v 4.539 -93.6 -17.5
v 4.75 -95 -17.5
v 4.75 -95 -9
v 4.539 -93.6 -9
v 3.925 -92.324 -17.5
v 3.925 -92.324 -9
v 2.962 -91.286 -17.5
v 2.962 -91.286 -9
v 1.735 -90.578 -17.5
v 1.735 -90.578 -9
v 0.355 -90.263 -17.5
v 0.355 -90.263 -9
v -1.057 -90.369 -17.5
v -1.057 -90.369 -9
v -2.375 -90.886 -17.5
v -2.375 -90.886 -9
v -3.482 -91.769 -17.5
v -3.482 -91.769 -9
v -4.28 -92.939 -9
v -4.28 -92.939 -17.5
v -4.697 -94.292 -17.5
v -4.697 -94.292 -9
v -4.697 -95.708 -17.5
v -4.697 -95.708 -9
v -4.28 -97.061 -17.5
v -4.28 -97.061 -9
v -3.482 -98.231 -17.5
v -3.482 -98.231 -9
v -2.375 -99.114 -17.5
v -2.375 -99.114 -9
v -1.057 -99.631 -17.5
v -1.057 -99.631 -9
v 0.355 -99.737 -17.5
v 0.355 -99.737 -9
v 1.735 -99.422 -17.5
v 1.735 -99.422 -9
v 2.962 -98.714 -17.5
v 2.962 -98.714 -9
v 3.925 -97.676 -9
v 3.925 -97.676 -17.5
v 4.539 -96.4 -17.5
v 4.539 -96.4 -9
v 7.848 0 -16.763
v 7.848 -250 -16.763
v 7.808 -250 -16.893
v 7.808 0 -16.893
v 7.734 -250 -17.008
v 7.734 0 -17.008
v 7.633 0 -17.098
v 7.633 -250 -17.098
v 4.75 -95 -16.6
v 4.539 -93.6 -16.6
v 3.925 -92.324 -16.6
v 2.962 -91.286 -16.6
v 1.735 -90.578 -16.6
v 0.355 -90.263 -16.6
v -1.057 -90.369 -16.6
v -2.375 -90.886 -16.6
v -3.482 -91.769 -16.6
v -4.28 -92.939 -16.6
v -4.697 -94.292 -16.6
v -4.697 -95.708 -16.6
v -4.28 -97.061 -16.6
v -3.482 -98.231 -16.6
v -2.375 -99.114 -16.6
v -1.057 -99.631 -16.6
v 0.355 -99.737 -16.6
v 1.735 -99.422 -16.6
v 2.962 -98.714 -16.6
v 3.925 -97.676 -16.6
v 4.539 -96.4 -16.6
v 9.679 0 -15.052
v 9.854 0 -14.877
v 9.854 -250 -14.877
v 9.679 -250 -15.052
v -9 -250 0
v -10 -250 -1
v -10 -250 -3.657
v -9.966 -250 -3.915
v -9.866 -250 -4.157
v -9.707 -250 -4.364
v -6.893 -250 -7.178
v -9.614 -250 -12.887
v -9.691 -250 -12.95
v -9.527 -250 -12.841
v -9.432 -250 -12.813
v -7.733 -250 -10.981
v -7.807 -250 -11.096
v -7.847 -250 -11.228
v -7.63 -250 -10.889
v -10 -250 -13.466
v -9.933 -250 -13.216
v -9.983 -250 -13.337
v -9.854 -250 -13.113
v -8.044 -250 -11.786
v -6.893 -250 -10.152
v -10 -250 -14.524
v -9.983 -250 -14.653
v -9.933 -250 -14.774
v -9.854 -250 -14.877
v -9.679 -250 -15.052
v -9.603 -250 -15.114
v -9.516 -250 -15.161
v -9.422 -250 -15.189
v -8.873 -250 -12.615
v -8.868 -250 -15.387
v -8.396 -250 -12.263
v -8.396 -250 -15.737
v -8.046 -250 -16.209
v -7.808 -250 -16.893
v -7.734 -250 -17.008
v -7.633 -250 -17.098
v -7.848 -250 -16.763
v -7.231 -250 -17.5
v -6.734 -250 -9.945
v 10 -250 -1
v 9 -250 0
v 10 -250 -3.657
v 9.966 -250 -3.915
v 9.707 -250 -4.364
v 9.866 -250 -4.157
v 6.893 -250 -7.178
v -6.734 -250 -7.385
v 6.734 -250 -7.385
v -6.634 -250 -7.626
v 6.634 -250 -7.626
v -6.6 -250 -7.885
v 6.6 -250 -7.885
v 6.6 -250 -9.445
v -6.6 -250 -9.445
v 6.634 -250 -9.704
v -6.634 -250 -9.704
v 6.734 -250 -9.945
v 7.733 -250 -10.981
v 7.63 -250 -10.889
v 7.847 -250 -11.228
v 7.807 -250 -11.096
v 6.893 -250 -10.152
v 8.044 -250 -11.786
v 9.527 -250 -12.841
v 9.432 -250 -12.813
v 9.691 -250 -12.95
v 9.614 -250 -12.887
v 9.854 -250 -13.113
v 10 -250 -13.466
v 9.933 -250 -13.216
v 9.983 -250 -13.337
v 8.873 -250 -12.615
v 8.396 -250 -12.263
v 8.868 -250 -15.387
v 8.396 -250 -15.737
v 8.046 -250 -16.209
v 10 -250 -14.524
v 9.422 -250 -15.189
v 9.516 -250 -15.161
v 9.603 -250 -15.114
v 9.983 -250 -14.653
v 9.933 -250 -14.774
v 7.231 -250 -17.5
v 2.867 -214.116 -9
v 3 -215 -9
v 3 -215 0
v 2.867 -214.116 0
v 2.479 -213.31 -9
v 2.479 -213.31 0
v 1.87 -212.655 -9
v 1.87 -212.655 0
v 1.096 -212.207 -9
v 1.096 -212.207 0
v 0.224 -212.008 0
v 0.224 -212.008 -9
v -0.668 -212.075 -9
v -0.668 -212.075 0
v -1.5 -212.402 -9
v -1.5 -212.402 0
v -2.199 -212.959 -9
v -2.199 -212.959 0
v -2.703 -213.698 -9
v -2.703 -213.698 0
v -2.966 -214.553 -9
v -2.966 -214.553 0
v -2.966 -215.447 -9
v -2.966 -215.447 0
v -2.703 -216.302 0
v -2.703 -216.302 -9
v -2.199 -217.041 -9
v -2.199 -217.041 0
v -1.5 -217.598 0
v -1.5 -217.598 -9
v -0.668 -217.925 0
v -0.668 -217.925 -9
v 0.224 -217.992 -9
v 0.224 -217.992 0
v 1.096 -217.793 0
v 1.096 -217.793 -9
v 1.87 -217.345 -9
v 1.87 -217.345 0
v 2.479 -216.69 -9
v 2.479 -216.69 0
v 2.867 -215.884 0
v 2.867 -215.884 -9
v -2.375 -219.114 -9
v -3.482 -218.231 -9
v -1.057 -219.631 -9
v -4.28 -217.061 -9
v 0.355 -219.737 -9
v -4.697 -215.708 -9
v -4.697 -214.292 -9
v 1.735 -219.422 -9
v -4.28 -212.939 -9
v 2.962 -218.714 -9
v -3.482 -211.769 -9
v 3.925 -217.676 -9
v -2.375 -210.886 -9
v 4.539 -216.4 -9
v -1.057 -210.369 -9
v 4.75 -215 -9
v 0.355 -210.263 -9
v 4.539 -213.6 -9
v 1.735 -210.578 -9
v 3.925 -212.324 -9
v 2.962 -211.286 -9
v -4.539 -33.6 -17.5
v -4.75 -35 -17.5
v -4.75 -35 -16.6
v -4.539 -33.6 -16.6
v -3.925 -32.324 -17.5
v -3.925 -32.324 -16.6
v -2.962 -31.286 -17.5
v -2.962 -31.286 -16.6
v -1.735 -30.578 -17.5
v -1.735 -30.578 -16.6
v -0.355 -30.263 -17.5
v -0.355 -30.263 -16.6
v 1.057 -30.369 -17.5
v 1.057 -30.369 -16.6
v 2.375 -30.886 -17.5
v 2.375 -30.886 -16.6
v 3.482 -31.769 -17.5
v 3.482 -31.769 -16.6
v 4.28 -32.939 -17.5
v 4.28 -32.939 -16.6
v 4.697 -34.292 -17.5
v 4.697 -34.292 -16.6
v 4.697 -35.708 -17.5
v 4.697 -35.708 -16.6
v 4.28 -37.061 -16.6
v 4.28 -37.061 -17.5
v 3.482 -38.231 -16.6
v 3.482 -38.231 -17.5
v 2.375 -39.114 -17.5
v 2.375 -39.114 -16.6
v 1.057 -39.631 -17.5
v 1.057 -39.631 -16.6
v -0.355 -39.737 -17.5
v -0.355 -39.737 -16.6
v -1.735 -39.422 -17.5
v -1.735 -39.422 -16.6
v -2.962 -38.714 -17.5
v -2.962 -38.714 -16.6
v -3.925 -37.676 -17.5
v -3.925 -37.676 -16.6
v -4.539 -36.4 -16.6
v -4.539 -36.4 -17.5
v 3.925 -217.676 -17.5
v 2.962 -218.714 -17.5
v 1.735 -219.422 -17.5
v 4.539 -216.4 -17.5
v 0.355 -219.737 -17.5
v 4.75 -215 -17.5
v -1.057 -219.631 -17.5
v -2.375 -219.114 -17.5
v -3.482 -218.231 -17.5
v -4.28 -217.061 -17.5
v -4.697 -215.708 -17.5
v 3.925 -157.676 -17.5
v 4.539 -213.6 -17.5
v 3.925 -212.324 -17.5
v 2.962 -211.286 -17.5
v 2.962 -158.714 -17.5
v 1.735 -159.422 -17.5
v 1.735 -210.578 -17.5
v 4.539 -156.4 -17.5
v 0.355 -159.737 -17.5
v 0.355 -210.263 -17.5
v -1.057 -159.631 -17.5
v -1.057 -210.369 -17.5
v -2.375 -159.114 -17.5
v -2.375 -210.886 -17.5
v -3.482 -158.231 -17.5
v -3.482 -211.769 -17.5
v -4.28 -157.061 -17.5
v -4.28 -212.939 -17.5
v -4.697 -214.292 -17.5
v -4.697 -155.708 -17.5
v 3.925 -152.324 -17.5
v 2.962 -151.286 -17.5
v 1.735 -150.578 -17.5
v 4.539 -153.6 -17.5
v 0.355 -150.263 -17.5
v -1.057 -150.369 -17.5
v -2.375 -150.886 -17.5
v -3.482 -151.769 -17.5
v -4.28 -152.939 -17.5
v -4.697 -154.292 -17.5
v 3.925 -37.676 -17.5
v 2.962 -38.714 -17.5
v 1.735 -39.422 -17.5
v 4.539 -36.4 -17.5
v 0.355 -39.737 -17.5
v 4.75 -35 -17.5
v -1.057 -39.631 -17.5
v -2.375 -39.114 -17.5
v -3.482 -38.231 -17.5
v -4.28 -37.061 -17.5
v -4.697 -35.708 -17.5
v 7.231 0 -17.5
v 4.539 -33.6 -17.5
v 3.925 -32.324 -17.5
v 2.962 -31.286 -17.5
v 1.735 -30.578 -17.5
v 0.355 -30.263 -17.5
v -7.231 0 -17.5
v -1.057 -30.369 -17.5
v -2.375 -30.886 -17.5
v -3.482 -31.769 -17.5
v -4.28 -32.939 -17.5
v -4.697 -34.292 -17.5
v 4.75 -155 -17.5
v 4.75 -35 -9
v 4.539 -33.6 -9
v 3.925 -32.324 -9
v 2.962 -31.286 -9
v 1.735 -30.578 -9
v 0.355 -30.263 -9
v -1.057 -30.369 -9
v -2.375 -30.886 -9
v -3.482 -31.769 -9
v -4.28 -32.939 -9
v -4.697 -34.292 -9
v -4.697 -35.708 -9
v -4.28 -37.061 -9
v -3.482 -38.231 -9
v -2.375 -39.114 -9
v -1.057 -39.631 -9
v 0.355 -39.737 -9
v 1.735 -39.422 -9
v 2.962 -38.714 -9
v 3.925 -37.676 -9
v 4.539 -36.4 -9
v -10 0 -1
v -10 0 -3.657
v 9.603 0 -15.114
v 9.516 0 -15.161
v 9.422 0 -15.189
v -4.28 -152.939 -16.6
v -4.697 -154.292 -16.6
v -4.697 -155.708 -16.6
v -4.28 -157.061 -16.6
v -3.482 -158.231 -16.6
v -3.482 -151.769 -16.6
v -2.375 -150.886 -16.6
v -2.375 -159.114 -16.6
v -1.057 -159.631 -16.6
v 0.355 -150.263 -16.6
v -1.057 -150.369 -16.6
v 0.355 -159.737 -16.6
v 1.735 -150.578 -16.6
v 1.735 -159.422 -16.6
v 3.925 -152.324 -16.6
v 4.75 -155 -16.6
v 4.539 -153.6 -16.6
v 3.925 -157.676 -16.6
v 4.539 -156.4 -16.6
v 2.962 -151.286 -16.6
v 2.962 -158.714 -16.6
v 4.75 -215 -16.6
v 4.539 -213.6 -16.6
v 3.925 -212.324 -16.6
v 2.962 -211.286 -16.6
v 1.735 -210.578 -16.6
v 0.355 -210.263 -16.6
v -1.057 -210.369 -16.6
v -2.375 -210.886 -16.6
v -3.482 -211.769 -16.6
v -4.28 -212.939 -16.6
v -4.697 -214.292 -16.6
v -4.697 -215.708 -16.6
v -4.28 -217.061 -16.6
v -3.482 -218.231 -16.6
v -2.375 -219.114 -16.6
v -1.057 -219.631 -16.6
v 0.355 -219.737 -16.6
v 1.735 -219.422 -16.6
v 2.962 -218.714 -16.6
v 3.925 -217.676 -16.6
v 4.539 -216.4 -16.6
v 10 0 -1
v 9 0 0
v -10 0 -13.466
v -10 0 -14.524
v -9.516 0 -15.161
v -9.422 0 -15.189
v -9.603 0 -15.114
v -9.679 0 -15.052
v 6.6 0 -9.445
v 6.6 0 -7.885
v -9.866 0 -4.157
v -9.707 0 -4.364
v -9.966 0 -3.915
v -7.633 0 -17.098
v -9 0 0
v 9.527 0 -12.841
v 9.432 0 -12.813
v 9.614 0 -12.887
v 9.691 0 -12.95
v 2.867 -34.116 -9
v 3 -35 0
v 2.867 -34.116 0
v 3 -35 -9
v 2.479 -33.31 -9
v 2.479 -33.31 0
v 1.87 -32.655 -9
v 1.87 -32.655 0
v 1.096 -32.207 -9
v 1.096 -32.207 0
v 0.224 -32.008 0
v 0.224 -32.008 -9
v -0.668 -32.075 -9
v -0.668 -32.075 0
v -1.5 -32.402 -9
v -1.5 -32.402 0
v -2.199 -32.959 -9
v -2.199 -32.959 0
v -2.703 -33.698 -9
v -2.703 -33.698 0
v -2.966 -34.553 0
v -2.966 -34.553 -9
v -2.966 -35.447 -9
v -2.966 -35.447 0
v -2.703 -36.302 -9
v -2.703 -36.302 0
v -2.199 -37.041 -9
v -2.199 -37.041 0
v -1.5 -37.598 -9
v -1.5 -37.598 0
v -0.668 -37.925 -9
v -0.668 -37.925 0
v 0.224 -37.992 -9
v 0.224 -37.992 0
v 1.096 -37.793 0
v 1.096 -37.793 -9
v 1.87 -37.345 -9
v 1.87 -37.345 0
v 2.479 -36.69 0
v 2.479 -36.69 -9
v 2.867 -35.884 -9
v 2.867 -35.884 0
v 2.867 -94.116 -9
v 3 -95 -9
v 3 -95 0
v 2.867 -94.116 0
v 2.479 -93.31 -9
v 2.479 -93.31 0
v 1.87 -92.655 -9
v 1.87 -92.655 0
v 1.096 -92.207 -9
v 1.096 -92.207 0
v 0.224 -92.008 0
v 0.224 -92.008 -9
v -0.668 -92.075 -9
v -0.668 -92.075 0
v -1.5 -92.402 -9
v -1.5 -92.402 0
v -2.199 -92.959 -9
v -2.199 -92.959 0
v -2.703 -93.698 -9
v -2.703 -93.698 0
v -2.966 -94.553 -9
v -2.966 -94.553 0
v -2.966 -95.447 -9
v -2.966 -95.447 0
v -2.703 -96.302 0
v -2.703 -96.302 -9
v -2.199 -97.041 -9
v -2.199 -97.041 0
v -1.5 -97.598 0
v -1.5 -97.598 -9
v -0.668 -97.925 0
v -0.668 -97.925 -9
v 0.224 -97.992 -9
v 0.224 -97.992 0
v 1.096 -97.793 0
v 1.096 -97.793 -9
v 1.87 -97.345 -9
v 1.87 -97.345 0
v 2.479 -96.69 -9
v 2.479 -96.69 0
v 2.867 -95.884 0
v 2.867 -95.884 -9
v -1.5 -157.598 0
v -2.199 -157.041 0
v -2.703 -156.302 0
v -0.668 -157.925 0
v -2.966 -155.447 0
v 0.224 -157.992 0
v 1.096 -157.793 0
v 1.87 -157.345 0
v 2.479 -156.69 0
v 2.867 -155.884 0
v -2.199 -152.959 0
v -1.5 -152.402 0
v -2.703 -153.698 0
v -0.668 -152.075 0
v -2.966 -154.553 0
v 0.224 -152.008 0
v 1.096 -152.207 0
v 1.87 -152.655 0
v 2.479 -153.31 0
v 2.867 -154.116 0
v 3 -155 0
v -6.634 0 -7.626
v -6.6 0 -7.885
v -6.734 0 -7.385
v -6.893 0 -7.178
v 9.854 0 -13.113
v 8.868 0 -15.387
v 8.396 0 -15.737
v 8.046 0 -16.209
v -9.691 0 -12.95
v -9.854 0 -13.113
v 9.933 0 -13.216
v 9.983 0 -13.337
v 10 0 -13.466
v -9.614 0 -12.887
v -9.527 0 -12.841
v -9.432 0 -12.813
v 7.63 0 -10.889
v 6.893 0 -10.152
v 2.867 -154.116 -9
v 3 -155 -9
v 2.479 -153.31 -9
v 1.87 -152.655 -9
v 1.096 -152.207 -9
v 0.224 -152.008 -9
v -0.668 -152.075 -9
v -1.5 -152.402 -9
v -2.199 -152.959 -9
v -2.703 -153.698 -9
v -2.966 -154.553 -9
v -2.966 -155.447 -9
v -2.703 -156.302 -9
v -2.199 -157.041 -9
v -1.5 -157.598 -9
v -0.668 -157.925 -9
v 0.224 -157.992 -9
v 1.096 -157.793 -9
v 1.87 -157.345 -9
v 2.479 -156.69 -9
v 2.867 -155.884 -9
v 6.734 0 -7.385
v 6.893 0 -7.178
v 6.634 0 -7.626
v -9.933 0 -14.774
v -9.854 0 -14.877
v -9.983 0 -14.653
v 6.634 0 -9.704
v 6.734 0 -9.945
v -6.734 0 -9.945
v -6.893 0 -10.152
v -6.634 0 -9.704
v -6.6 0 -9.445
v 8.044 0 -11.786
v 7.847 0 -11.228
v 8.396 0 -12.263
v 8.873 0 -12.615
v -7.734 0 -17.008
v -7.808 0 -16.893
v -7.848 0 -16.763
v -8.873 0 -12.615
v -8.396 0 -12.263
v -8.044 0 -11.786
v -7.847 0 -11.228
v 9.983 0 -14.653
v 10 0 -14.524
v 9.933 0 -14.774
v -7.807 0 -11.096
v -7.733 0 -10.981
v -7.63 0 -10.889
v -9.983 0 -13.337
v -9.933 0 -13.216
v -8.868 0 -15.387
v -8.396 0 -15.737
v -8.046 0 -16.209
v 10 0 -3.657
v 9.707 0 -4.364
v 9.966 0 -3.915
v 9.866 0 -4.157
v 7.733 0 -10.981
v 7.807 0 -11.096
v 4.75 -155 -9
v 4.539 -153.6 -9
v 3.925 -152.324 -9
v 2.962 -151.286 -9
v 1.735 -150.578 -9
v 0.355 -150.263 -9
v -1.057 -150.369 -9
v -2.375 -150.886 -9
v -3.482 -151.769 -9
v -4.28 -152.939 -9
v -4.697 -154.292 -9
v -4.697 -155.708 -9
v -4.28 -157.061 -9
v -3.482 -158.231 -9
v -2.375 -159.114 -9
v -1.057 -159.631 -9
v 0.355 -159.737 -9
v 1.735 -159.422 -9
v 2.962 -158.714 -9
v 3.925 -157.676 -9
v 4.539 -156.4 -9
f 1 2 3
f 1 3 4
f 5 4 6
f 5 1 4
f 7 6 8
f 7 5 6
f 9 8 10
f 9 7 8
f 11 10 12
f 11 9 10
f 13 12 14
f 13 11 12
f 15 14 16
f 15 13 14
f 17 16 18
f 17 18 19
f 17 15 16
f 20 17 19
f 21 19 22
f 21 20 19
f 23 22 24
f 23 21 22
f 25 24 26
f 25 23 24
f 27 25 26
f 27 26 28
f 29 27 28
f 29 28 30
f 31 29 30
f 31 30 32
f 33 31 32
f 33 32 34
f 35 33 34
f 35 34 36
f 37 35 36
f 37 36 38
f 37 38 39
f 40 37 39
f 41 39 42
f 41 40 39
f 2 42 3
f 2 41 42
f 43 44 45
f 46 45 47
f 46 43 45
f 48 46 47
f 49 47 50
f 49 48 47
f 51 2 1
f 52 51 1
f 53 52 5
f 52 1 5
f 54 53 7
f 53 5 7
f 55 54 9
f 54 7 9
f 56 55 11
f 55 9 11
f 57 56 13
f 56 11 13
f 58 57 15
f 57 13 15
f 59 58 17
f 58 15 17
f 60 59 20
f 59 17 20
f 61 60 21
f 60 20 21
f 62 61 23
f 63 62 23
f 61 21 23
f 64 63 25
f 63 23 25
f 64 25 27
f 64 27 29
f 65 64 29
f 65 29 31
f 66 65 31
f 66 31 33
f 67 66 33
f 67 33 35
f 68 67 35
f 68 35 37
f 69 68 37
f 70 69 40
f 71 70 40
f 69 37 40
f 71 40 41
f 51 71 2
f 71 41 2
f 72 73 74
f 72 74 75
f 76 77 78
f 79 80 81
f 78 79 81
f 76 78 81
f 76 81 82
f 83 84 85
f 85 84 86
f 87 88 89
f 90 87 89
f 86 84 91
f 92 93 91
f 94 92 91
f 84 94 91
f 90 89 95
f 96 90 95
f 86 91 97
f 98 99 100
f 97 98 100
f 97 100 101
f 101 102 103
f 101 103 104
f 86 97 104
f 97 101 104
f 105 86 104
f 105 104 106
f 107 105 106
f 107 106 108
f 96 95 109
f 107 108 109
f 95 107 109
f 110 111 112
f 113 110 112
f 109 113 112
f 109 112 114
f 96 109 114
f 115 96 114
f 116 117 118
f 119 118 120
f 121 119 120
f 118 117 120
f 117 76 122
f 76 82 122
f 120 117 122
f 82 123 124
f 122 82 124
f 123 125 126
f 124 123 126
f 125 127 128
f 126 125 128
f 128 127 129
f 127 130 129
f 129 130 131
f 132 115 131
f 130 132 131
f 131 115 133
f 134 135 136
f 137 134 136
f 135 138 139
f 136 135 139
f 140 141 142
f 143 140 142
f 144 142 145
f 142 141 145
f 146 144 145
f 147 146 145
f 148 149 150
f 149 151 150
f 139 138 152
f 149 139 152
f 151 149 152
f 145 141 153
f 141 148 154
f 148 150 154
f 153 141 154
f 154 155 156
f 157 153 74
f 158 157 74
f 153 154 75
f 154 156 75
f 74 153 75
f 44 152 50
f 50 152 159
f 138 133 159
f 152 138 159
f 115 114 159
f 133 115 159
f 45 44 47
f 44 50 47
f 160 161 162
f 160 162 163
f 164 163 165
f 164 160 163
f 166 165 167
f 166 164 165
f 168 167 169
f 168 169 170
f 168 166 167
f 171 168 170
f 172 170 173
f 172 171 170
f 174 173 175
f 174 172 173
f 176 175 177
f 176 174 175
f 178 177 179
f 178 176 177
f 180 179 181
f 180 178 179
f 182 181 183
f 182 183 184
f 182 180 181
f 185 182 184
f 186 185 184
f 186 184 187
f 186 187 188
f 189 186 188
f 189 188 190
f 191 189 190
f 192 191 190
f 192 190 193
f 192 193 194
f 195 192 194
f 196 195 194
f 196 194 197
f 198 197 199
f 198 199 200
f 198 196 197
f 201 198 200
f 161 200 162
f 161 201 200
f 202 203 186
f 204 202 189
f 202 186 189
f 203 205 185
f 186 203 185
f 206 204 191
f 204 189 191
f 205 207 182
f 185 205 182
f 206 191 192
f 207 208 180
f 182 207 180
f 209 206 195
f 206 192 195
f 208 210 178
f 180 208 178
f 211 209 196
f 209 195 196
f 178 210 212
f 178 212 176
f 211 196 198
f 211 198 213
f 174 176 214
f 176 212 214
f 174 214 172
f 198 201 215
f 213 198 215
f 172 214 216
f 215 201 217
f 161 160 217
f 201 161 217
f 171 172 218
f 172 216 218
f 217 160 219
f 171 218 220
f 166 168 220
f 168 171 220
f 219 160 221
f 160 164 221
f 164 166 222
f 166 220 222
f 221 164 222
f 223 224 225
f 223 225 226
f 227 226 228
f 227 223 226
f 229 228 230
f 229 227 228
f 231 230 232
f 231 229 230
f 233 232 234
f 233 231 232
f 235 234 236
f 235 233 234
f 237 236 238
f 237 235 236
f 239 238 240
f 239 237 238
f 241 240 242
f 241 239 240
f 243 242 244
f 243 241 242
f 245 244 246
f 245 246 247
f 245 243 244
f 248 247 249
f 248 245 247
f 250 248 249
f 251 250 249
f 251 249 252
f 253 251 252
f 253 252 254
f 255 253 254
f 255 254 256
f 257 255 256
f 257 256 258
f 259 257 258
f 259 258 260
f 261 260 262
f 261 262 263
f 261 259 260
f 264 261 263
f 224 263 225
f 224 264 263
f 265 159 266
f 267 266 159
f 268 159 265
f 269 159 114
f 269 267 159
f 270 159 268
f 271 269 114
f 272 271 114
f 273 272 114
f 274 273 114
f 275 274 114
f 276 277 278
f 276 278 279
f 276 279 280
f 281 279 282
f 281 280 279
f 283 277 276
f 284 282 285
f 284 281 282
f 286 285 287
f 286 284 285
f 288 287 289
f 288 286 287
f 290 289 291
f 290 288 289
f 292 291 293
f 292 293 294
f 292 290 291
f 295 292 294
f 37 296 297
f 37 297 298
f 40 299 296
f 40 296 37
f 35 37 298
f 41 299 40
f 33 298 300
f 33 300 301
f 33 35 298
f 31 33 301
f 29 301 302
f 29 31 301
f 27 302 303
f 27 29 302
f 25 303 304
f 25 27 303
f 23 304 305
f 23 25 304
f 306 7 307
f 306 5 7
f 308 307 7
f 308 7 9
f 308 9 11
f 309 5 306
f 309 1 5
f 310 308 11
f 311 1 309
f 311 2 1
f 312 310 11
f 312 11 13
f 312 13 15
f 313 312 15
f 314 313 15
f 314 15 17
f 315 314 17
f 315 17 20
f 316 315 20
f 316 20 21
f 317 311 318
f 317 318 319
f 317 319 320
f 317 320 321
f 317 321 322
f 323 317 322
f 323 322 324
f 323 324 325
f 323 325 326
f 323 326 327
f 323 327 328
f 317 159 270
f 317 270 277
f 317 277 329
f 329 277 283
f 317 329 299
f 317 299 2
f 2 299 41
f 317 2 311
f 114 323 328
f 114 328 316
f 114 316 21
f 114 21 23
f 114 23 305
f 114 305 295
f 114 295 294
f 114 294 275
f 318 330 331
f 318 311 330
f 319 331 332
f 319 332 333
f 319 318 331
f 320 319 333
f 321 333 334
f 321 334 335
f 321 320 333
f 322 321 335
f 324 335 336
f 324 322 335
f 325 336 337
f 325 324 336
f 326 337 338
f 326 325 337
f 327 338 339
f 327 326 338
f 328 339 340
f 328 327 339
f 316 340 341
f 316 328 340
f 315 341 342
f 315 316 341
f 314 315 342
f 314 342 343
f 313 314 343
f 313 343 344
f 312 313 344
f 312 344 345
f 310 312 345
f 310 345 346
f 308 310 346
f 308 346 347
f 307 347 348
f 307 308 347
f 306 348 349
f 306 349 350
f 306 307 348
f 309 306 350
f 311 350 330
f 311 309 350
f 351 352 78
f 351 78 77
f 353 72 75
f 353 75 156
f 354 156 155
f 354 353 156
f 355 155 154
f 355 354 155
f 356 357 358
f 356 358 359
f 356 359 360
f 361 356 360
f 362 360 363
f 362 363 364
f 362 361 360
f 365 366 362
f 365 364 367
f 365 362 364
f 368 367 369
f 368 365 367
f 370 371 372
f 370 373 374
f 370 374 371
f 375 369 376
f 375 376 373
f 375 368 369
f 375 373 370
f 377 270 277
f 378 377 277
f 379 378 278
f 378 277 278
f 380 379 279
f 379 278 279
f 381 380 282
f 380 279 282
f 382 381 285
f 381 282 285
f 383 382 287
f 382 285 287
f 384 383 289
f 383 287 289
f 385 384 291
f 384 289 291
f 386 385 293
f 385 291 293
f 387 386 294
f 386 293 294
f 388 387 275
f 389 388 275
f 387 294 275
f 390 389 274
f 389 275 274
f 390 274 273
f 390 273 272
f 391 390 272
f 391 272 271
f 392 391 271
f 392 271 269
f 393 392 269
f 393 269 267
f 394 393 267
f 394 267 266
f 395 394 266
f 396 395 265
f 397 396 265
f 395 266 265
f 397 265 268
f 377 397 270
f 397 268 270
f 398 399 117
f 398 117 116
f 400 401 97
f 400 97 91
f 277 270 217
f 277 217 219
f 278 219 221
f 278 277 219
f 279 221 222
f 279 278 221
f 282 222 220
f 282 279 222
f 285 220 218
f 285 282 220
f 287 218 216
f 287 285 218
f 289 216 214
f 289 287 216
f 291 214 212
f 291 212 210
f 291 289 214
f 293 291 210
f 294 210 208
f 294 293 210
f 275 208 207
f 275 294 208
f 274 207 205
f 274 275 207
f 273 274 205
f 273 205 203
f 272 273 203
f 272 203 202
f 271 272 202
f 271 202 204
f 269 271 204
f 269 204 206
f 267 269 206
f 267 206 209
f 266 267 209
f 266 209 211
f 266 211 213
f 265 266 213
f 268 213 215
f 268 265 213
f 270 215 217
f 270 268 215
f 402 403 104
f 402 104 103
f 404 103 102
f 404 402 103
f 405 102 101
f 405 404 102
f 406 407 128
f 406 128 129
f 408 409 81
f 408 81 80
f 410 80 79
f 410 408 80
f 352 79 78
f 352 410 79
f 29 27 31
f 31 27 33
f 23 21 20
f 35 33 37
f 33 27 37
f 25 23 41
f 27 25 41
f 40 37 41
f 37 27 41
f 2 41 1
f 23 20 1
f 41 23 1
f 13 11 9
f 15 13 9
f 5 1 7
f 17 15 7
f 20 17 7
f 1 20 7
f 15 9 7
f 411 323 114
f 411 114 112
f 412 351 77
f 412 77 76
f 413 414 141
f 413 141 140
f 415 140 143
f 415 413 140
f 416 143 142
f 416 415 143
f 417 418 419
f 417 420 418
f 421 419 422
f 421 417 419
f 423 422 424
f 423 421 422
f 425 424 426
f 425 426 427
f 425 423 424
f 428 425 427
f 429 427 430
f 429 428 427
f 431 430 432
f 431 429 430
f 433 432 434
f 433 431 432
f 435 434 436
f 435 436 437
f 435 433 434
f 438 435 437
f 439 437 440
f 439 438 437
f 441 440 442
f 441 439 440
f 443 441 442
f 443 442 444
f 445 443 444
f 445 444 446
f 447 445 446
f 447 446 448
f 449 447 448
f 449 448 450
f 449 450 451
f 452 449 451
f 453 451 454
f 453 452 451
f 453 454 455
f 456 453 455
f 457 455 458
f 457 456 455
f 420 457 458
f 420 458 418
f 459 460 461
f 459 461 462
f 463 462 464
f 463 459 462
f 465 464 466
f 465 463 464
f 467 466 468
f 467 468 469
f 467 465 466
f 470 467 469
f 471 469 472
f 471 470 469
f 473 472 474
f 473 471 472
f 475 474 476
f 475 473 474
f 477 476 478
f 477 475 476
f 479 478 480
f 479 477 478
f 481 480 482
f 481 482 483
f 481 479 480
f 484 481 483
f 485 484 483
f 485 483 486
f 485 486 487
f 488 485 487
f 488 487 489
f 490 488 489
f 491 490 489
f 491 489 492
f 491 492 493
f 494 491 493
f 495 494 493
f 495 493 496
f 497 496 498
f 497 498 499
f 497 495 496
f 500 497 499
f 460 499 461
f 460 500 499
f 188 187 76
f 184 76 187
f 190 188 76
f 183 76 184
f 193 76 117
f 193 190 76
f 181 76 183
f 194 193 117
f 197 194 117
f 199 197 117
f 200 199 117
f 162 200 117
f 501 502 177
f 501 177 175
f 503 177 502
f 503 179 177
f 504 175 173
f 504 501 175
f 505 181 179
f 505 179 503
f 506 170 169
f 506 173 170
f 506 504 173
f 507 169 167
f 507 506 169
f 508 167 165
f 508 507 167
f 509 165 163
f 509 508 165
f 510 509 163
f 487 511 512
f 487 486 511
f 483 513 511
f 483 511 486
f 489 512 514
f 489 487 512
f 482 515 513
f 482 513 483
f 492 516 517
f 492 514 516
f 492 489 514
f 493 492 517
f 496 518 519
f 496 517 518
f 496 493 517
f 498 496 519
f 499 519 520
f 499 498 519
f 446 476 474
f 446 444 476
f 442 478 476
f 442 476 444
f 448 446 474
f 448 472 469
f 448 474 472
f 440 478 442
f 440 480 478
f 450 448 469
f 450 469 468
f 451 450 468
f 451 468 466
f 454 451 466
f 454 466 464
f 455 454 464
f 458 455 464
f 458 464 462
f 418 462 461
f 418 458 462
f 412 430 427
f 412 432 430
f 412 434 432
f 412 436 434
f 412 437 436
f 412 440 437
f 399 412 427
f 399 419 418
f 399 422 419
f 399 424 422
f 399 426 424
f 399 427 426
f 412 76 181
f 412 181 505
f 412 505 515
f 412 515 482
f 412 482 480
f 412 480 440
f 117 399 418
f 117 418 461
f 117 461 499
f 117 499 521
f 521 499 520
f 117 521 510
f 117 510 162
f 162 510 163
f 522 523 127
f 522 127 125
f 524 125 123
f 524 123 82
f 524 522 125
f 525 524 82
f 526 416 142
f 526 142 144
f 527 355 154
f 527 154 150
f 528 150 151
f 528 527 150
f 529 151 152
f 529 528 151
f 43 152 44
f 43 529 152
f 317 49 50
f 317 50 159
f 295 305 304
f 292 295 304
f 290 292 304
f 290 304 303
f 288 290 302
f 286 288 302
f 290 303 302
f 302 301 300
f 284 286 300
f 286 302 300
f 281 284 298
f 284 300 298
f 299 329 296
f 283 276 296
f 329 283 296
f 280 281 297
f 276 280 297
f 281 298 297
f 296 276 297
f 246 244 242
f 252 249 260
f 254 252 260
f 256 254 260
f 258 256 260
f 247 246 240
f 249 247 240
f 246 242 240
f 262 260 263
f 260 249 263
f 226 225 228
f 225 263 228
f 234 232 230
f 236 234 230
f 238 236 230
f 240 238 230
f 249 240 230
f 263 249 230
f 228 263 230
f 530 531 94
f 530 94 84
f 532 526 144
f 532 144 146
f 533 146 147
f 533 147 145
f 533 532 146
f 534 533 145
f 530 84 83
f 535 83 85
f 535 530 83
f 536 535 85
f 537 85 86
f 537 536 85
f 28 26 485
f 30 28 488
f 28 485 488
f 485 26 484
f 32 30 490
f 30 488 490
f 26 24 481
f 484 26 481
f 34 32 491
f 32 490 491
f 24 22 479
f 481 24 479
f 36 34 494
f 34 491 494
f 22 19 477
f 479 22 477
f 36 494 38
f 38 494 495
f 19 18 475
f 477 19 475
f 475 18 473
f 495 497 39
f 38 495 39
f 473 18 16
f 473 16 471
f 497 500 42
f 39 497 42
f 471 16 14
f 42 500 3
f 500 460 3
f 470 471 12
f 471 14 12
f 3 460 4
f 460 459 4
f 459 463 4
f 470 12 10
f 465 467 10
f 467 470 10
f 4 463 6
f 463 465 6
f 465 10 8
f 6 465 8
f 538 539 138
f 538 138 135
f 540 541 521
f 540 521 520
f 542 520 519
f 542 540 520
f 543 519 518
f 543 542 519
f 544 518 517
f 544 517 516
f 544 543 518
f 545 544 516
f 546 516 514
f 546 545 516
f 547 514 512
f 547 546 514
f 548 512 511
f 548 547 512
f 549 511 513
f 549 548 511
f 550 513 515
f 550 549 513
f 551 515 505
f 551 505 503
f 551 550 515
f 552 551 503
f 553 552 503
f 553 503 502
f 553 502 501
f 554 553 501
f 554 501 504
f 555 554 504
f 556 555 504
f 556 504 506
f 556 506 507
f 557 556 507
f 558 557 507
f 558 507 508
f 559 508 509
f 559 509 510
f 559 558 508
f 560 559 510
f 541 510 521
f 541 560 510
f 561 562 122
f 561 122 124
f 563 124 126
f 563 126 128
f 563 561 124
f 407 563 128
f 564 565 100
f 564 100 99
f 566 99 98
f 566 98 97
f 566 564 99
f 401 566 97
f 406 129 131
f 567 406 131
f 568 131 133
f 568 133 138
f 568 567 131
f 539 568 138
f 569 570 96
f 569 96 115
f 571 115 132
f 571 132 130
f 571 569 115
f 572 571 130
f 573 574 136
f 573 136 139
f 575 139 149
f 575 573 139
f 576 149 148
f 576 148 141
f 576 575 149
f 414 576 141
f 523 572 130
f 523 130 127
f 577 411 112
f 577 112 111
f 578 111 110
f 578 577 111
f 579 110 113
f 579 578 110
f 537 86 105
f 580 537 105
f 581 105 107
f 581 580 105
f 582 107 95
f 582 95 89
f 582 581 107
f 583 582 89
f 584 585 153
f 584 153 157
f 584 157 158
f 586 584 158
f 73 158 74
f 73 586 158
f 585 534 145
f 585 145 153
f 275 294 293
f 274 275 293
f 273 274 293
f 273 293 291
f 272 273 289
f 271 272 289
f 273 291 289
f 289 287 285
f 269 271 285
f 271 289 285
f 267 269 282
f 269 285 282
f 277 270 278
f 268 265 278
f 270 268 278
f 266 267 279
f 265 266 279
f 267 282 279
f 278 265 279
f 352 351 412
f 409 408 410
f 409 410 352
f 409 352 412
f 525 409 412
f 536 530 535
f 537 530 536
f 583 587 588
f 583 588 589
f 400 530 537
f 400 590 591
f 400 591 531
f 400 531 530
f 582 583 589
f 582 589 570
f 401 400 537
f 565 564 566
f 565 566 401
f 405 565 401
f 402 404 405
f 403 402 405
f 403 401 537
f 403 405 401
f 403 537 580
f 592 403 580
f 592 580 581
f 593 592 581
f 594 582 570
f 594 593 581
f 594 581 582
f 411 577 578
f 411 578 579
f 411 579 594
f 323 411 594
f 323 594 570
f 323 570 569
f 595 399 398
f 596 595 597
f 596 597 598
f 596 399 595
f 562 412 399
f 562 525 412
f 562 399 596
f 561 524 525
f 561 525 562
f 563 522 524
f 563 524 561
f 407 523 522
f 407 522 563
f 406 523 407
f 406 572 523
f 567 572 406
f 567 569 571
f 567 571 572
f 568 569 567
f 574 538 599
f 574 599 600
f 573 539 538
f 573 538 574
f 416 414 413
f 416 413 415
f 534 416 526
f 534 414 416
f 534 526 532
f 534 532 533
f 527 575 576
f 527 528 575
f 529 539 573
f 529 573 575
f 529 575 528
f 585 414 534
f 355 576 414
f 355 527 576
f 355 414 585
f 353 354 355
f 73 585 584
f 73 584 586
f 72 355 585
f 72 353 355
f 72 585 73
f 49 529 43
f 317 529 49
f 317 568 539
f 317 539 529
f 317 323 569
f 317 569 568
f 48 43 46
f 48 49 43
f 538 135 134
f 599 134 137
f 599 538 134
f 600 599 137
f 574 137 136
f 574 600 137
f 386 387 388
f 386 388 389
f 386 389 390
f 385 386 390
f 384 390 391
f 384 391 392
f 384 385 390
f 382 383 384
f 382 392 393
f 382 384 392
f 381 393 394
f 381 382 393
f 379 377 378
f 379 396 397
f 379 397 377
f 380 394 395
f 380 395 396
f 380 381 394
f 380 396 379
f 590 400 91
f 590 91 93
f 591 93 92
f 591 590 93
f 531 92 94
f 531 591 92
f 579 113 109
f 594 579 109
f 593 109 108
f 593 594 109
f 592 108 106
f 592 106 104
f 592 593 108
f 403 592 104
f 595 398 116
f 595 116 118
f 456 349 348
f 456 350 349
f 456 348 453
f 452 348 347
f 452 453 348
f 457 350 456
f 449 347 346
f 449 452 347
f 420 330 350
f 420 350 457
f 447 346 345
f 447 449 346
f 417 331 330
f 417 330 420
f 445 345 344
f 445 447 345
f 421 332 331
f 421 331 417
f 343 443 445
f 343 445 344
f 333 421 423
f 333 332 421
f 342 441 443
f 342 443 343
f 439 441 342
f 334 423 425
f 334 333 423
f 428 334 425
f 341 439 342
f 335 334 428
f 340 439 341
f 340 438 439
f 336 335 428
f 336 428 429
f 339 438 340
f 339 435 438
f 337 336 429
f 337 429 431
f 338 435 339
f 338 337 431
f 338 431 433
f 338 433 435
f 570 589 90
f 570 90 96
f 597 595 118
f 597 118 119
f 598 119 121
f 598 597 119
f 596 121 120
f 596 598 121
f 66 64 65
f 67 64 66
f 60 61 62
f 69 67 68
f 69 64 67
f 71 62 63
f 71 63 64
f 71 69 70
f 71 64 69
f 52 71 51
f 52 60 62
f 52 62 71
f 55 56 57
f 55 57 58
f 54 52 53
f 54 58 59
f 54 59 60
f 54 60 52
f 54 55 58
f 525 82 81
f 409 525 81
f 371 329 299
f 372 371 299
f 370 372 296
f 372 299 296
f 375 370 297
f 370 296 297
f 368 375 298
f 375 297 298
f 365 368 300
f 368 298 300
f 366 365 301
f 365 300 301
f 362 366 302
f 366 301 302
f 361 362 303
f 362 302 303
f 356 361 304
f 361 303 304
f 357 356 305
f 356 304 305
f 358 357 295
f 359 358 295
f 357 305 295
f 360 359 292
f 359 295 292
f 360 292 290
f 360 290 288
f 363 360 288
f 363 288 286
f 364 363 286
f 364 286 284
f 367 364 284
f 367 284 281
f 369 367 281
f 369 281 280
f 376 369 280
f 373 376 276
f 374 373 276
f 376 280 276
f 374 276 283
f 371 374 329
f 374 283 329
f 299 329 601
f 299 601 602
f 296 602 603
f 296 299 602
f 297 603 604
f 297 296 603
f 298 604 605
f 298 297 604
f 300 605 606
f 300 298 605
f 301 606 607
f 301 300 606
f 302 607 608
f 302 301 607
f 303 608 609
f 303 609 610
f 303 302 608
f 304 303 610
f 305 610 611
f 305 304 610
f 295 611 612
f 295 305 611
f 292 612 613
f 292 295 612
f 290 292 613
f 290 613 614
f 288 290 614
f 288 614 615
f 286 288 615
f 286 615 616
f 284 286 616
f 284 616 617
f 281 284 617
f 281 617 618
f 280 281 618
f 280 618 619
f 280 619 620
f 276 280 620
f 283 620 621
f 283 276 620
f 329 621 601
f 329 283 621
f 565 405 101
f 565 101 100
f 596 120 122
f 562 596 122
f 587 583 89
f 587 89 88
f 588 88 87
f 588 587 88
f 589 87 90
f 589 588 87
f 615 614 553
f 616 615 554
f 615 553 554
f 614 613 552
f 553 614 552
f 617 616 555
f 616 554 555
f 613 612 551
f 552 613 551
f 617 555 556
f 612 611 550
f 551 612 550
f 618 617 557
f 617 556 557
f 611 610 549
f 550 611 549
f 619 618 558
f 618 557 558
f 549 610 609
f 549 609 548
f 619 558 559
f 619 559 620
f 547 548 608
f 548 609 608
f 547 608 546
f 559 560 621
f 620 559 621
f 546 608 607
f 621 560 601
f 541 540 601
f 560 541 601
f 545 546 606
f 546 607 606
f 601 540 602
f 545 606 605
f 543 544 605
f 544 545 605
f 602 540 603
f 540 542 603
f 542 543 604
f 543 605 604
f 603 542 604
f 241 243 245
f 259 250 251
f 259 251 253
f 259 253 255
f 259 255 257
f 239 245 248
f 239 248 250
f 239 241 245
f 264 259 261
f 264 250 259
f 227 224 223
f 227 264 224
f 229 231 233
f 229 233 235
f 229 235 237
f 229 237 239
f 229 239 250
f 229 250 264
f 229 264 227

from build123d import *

# Parameters (mm, degrees)
EXTRUDE_1_DEPTH              = 250
SKETCH_80_R                  = 4.75
EXTRUDE_12_DEPTH             = 0.9
PATTERN_START                = -17.499999985
PATTERN_LINEAR_1_OUTLINE_R   = 4.75
PATTERN_LINEAR_1_DEPTH       = 0.9
PATTERN_LINEAR_1_2_OUTLINE_R = 4.75
PATTERN_LINEAR_1_2_DEPTH     = 0.9
PATTERN_LINEAR_1_3_OUTLINE_R = 4.75
PATTERN_LINEAR_1_3_DEPTH     = 0.9
PATTERN_LINEAR_1_4_OUTLINE_R = 4.75
PATTERN_LINEAR_1_4_DEPTH     = 8.499999985
PATTERN_START_2              = -9
PATTERN_LINEAR_1_5_OUTLINE_R = 3
PATTERN_LINEAR_1_5_DEPTH     = 9


# Read off the part's stored shape, not the designer's step: Линейный массив1
with BuildPart() as part:
    # Эскиз1 → Бобышка-Вытянуть1 (new body)
    with BuildSketch(Plane(origin=(0, 0, 0), x_dir=(1, 0, 0), z_dir=(0, 1, 0))):
        with BuildLine():
            Line((-10, 3.656507036), (-10, 1))
            Line((-10, 1), (-9, 0))
            Line((-9, 0), (9, 0))
            Line((9, 0), (10, 1))
            Line((10, 1), (10, 3.656507036))
            ThreePointArc((10, 3.656507036), (9.92387953, 4.039190479), (9.707106773, 4.363613837))
            Line((9.707106773, 4.363613837), (6.892893227, 7.177827383))
            ThreePointArc((6.892893227, 7.177827383), (6.67612047, 7.502250741), (6.6, 7.884934184))
            Line((6.6, 7.884934184), (6.6, 9.445065806))
            ThreePointArc((6.6, 9.445065806), (6.67612047, 9.827749249), (6.892893227, 10.152172607))
            Line((6.892893227, 10.152172607), (7.63016236, 10.88944174))
            ThreePointArc((7.63016236, 10.88944174), (7.773916172, 11.035785914), (7.84680643, 11.2275378))
            ThreePointArc((7.84680643, 11.2275378), (8.39638832, 12.26292769), (9.431778202, 12.812509595))
            ThreePointArc((9.431778202, 12.812509595), (9.571493891, 12.861817755), (9.690625709, 12.949905089))
            Line((9.690625709, 12.949905089), (9.85355341, 13.11283279))
            ThreePointArc((9.85355341, 13.11283279), (9.961939771, 13.275044443), (10, 13.466386134))
            Line((10, 13.466386134), (10, 14.523613836))
            ThreePointArc((10, 14.523613836), (9.961939771, 14.714955527), (9.85355341, 14.87716718))
            Line((9.85355341, 14.87716718), (9.678500897, 15.052219693))
            ThreePointArc((9.678500897, 15.052219693), (9.560417661, 15.139748844), (9.421985093, 15.189159641))
            ThreePointArc((9.421985093, 15.189159641), (8.395921978, 15.736919382), (7.84816224, 16.7629825))
            ThreePointArc((7.84816224, 16.7629825), (7.775191486, 16.953000828), (7.632531165, 17.098189425))
            Line((7.632531165, 17.098189425), (7.230720605, 17.499999985))
            Line((7.230720605, 17.499999985), (-7.230720615, 17.499999985))
            Line((-7.230720615, 17.499999985), (-7.632531175, 17.098189425))
            ThreePointArc((-7.632531175, 17.098189425), (-7.775191503, 16.953000832), (-7.84816225, 16.7629825))
            ThreePointArc((-7.84816225, 16.7629825), (-8.395921997, 15.736919373), (-9.421985128, 15.189159636))
            ThreePointArc((-9.421985128, 15.189159636), (-9.560417671, 15.13974885), (-9.678500884, 15.052219716))
            Line((-9.678500884, 15.052219716), (-9.85355341, 14.87716719))
            ThreePointArc((-9.85355341, 14.87716719), (-9.961939771, 14.714955537), (-10, 14.523613846))
            Line((-10, 14.523613846), (-10, 13.466386134))
            ThreePointArc((-10, 13.466386134), (-9.961939771, 13.275044443), (-9.85355341, 13.11283279))
            Line((-9.85355341, 13.11283279), (-9.690625667, 12.949905047))
            ThreePointArc((-9.690625667, 12.949905047), (-9.57149389, 12.861817745), (-9.431778248, 12.812509604))
            ThreePointArc((-9.431778248, 12.812509604), (-8.396388337, 12.262927707), (-7.84680643, 11.2275378))
            ThreePointArc((-7.84680643, 11.2275378), (-7.773916168, 11.035785916), (-7.63016236, 10.88944174))
            Line((-7.63016236, 10.88944174), (-6.892893227, 10.152172607))
            ThreePointArc((-6.892893227, 10.152172607), (-6.67612047, 9.827749249), (-6.6, 9.445065806))
            Line((-6.6, 9.445065806), (-6.6, 7.884934184))
            ThreePointArc((-6.6, 7.884934184), (-6.67612047, 7.502250741), (-6.892893227, 7.177827383))
            Line((-6.892893227, 7.177827383), (-9.707106773, 4.363613837))
            ThreePointArc((-9.707106773, 4.363613837), (-9.92387953, 4.039190479), (-10, 3.656507036))
        make_face()
    extrude(amount=-EXTRUDE_1_DEPTH)

    # Эскиз6 → Вырез-Повернуть1 (revolve, cut)
    with BuildSketch(Plane(origin=(0, 30, 0), x_dir=(0, -1, 0), z_dir=(1, 0, 0)), mode=Mode.PRIVATE) as cut_revolve_1_sk:
        Polygon((60.25, 17.499999985), (65, 17.499999985), (65, 0), (62, 0), (62, 9), (60.25, 9), align=None)
    revolve(cut_revolve_1_sk.sketch.rotate(Axis((0, -35, -17.499999985), (0, 0, 1)), 270), axis=Axis((0, -35, -17.499999985), (0, 0, 1)), mode=Mode.SUBTRACT)

    # Pattern Linear 1 4 outline → Pattern Linear 1 4 (cut)
    with BuildSketch(Plane.XY.offset(PATTERN_START)):
        with Locations((0, -95)):
            Circle(PATTERN_LINEAR_1_4_OUTLINE_R)
        with Locations((0, -155)):
            Circle(PATTERN_LINEAR_1_4_OUTLINE_R)
        with Locations((0, -215)):
            Circle(PATTERN_LINEAR_1_4_OUTLINE_R)
    extrude(amount=PATTERN_LINEAR_1_4_DEPTH, mode=Mode.SUBTRACT)

    # Pattern Linear 1 5 outline → Pattern Linear 1 5 (cut)
    with BuildSketch(Plane.XY.offset(PATTERN_START_2)):
        with Locations((0, -95)):
            Circle(PATTERN_LINEAR_1_5_OUTLINE_R)
        with Locations((0, -155)):
            Circle(PATTERN_LINEAR_1_5_OUTLINE_R)
        with Locations((0, -215)):
            Circle(PATTERN_LINEAR_1_5_OUTLINE_R)
    extrude(amount=PATTERN_LINEAR_1_5_DEPTH, mode=Mode.SUBTRACT)


with BuildPart() as body_2:
    # Эскиз80 → Бобышка-Вытянуть12 (new body)
    with BuildSketch(Plane(origin=(0, 0, -17.499999985), x_dir=(-1, 0, 0), z_dir=(0, 0, -1))):
        with Locations((0, -35)):
            Circle(SKETCH_80_R)
    extrude(amount=-EXTRUDE_12_DEPTH)


with BuildPart() as body_3:
    # Линейный массив1 outline → Линейный массив1 (new body)
    with BuildSketch(Plane.XY.offset(PATTERN_START)):
        with Locations((0, -215)):
            Circle(PATTERN_LINEAR_1_OUTLINE_R)
    extrude(amount=PATTERN_LINEAR_1_DEPTH)


with BuildPart() as body_4:
    # Pattern Linear 1 2 outline → Pattern Linear 1 2 (new body)
    with BuildSketch(Plane.XY.offset(PATTERN_START)):
        with Locations((0, -155)):
            Circle(PATTERN_LINEAR_1_2_OUTLINE_R)
    extrude(amount=PATTERN_LINEAR_1_2_DEPTH)


with BuildPart() as body_5:
    # Pattern Linear 1 3 outline → Pattern Linear 1 3 (new body)
    with BuildSketch(Plane.XY.offset(PATTERN_START)):
        with Locations((0, -95)):
            Circle(PATTERN_LINEAR_1_3_OUTLINE_R)
    extrude(amount=PATTERN_LINEAR_1_3_DEPTH)


solid = Compound([part.part, body_2.part, body_3.part, body_4.part, body_5.part])
